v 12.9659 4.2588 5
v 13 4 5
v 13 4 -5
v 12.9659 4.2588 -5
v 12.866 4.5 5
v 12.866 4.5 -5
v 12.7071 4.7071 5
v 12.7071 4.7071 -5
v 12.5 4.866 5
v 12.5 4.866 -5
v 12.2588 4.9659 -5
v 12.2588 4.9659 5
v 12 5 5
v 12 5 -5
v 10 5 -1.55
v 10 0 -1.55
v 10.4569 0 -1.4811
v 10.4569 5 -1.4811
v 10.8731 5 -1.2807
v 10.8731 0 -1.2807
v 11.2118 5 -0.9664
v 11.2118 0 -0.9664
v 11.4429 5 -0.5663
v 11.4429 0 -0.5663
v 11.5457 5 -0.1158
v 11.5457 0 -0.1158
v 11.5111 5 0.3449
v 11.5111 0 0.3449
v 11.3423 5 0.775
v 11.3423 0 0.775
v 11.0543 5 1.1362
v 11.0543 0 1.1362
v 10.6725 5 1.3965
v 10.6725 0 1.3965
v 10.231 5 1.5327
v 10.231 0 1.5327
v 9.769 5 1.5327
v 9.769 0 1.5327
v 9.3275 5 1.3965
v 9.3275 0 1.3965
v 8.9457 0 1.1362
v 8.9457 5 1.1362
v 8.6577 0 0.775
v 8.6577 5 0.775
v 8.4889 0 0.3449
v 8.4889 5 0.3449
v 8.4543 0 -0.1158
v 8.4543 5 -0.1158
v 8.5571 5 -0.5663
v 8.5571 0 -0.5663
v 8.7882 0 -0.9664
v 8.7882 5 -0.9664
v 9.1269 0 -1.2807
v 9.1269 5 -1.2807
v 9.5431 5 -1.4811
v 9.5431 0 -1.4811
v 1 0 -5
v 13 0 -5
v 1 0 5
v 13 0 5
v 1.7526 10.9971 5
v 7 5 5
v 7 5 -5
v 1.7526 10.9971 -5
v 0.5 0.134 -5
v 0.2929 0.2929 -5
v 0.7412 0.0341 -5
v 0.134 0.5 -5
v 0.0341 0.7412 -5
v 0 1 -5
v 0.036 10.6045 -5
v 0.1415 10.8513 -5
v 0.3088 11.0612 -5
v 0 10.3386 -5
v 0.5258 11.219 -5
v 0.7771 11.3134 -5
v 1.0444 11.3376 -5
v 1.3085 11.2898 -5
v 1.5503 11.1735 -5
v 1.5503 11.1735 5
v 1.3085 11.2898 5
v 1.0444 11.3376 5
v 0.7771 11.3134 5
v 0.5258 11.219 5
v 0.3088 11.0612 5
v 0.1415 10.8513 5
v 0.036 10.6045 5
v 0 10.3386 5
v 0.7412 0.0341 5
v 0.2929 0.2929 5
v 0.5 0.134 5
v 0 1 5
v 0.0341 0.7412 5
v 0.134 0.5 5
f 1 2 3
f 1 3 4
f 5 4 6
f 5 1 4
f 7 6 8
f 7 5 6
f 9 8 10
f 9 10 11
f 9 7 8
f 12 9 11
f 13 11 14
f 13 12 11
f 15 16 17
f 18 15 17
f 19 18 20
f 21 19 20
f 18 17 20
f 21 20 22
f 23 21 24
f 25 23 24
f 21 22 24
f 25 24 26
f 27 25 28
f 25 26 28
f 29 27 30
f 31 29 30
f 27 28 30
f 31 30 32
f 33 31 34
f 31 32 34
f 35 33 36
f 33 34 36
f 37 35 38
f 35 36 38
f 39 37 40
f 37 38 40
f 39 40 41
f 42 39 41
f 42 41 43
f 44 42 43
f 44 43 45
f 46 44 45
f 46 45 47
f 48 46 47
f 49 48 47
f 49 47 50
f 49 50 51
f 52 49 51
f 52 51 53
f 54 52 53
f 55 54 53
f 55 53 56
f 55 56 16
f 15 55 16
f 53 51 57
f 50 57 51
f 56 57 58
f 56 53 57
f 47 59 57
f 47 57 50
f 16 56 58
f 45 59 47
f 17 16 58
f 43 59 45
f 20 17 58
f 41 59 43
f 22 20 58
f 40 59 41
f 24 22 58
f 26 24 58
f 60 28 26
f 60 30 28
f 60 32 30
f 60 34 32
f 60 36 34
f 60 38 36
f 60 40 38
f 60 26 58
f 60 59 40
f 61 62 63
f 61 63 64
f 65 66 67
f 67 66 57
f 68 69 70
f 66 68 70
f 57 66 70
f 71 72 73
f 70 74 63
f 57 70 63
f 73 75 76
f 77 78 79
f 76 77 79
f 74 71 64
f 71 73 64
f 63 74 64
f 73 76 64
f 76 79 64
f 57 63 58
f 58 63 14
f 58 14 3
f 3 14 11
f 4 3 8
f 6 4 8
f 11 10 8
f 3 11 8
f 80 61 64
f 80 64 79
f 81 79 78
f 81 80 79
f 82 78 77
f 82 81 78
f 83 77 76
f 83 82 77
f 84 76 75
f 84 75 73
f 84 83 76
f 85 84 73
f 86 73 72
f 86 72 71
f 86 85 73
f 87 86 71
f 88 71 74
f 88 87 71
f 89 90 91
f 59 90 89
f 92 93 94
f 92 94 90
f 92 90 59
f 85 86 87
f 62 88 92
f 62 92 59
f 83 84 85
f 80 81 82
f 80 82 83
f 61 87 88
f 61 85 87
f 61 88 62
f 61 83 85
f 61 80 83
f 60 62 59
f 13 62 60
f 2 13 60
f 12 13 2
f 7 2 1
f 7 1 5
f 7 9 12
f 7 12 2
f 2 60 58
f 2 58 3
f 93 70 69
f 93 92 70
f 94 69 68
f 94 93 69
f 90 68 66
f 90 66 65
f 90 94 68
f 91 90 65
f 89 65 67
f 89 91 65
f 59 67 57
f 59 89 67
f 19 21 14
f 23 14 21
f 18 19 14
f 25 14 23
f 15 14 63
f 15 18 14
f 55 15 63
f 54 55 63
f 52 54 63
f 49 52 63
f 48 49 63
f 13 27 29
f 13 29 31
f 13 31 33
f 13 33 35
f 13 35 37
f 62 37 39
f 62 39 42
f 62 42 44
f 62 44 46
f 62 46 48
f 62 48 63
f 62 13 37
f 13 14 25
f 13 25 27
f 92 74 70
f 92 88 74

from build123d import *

# Parameters (mm, degrees)
BOSS_EXTRUDE1_DEPTH = 5
SKETCH2_R           = 1.55
CUT_EXTRUDE1_DEPTH  = 10


with BuildPart() as part:
    # Sketch1 → Boss-Extrude1 (new, symmetric)
    with BuildSketch(Plane.XY):
        with BuildLine():
            Line((1, 0), (13, 0))
            Line((13, 0), (13, 4))
            ThreePointArc((13, 4), (12.707106781, 4.707106781), (12, 5))
            Line((12, 5), (7, 5))
            Line((7, 5), (1.752576695, 10.997055206))
            ThreePointArc((1.752576695, 10.997055206), (0.648273327, 11.274653342), (0, 10.338550598))
            Line((0, 10.338550598), (0, 1))
            ThreePointArc((0, 1), (0.292893219, 0.292893219), (1, 0))
        make_face()
    extrude(amount=BOSS_EXTRUDE1_DEPTH, both=True)

    # Sketch2 → Cut-Extrude1 (cut)
    with BuildSketch(Plane.XZ):
        with Locations(Location((10, 0, 0), (0, 0, 270))):
            Circle(SKETCH2_R)
    extrude(amount=-CUT_EXTRUDE1_DEPTH, mode=Mode.SUBTRACT)


solid = part.part
